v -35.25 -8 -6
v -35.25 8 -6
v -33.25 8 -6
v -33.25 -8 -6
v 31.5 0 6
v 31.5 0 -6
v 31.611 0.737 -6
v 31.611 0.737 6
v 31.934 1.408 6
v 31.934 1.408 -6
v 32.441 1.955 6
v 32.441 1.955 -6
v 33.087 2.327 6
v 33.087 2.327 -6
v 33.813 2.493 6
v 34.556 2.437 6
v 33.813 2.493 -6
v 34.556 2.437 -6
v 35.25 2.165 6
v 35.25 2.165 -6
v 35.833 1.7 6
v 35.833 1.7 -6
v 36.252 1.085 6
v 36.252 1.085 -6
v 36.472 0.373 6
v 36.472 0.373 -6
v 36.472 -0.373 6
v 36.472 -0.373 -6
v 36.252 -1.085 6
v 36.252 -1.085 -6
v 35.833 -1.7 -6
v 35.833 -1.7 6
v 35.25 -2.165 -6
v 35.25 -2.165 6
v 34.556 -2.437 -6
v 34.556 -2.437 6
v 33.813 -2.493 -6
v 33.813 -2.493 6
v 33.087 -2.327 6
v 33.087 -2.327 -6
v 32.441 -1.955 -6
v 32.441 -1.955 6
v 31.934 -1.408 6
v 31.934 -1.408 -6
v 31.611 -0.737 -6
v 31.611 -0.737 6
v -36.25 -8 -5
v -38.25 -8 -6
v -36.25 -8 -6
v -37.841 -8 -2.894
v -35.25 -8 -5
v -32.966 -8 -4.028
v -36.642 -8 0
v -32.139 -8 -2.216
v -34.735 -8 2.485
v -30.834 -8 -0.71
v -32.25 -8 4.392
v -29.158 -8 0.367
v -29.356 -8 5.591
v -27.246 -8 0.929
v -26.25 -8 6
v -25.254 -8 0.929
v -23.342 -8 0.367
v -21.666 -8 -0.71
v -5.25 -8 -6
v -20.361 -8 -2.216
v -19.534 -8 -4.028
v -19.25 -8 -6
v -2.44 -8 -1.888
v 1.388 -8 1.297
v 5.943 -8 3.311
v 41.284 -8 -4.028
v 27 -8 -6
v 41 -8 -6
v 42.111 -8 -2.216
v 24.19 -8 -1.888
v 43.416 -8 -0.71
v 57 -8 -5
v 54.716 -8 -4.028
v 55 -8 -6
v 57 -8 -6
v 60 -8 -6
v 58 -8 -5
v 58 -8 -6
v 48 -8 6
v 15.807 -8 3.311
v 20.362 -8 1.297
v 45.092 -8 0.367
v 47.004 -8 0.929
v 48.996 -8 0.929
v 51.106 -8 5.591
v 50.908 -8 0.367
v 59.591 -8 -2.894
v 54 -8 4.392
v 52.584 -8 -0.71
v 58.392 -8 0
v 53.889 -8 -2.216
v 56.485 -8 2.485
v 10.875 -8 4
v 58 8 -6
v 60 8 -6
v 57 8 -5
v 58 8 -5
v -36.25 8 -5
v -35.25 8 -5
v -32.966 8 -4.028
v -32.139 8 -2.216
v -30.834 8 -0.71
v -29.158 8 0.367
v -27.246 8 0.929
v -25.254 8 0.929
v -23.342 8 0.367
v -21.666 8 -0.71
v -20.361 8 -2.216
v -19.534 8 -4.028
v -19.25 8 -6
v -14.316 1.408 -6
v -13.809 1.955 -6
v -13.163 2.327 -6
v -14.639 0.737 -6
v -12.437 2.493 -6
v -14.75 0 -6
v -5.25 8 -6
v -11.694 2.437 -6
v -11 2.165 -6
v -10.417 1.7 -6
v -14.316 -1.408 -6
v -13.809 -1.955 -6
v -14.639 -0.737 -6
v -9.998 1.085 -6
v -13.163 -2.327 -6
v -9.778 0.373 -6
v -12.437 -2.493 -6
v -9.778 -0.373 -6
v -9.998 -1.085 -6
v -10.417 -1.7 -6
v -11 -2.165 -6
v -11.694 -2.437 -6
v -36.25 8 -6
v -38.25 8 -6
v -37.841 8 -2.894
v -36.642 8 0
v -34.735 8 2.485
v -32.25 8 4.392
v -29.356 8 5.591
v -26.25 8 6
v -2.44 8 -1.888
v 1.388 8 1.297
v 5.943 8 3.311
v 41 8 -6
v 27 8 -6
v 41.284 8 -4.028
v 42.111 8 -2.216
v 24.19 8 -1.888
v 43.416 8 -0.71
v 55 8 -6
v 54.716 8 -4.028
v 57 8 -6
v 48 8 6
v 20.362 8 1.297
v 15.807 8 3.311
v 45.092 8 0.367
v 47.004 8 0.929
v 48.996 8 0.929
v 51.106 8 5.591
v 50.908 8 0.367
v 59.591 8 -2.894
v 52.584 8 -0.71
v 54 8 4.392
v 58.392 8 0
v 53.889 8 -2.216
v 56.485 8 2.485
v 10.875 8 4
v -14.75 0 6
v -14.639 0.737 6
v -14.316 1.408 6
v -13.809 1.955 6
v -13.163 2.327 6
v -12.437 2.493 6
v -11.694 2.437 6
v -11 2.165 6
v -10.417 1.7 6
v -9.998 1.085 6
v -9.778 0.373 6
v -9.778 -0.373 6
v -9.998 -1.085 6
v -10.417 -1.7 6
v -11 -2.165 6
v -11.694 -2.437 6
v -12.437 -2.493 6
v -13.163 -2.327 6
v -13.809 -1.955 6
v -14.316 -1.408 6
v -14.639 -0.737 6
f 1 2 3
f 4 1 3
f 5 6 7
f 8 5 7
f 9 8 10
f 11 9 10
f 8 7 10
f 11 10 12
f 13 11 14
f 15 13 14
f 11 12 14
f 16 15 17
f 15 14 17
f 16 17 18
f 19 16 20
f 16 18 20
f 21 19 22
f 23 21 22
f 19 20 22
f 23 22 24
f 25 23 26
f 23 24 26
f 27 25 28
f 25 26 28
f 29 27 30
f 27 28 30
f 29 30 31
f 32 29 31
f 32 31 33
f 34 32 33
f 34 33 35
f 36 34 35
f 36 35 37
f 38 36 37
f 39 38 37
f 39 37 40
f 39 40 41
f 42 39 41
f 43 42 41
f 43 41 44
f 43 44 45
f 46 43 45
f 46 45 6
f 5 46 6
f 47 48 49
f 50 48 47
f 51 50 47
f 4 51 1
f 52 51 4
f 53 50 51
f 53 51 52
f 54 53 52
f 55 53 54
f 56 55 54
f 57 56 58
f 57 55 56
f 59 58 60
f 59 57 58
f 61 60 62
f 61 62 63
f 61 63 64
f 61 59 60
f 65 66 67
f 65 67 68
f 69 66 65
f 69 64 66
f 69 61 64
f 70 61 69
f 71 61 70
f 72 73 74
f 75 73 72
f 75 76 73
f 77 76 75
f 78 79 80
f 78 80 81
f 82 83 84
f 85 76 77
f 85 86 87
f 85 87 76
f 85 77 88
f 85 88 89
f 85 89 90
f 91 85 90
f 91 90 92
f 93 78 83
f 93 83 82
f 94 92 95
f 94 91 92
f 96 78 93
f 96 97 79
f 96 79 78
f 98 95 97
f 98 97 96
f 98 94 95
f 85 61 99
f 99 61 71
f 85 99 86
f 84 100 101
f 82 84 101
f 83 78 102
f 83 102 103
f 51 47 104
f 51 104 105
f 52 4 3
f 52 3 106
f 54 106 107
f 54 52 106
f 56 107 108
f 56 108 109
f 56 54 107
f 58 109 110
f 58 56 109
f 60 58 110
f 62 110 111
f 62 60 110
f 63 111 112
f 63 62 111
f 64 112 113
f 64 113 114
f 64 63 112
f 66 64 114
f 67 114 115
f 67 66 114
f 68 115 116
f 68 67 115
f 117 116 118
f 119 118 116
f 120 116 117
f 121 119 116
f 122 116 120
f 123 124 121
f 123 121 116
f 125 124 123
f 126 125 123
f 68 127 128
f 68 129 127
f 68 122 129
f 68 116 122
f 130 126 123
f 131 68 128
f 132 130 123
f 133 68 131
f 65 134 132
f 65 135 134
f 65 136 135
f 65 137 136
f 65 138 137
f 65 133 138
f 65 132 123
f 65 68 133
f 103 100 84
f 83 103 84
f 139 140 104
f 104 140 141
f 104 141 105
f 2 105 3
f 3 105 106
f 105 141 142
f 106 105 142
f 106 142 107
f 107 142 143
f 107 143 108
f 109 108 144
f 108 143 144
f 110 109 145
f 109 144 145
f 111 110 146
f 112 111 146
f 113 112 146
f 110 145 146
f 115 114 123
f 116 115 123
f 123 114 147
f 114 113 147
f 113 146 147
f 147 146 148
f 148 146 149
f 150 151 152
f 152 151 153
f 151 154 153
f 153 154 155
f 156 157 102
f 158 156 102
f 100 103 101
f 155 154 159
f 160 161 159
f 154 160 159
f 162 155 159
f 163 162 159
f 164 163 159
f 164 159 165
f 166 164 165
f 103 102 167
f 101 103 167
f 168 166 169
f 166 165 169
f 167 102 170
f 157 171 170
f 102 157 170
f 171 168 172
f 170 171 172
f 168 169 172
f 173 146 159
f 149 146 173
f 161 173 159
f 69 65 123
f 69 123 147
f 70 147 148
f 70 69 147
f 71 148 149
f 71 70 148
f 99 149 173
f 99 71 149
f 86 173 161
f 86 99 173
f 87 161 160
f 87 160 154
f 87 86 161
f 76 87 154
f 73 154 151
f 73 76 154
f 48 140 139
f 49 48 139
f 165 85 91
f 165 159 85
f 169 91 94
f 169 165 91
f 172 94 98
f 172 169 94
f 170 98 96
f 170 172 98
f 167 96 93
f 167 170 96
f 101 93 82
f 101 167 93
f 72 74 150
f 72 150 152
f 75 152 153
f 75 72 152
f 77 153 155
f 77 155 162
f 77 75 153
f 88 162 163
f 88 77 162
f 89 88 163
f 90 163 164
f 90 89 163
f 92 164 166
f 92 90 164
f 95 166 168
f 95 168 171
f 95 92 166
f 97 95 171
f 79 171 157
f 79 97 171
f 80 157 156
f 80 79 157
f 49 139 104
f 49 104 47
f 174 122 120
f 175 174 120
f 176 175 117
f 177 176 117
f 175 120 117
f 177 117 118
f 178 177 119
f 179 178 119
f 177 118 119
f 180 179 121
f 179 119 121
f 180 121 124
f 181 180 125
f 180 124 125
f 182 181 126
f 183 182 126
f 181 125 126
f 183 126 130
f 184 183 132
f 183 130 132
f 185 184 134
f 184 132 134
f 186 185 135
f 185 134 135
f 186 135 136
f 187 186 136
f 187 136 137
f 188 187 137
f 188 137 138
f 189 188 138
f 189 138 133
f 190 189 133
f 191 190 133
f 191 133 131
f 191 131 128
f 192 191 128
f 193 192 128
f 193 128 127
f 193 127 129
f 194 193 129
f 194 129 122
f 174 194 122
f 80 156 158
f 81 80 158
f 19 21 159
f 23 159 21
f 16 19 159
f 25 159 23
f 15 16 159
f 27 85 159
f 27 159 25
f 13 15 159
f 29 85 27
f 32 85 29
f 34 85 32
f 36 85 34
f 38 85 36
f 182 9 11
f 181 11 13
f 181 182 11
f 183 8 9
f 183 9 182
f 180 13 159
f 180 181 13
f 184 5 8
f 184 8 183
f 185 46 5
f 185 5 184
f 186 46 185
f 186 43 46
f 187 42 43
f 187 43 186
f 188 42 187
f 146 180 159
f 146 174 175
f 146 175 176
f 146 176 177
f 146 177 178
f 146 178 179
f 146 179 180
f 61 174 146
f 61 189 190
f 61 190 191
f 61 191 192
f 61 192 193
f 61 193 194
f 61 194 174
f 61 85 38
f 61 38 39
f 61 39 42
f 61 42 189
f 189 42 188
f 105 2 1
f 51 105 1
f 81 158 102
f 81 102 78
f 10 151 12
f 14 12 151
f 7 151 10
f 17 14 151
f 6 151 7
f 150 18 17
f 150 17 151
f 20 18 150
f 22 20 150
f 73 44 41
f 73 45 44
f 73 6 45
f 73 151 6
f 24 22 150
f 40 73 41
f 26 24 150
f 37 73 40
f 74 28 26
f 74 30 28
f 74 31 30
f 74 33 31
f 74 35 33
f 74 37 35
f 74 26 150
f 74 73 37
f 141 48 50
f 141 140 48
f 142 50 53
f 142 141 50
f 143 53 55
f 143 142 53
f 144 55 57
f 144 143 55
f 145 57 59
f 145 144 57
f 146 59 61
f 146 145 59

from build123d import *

# Parameters (mm, degrees)
F1_DEPTH = 8
F3_R     = 11.99999
F4_D     = 5
F5_W     = 1
F5_H     = 16
F6_DEPTH = 1


# Not quite as in the source:
# - a fillet or chamfer is up to 0.001 mm smaller than in the source, because OpenCascade refuses the exact size


with BuildPart() as f1:
    # F0 (on Front) → F1 (new body, symmetric)
    with BuildSketch(Plane.XZ):
        with BuildLine():
            Line((-38.25, -6), (-33.25, -6))
            ThreePointArc((-33.25, -6), (-26.25, 1), (-19.25, -6))
            Line((-19.25, -6), (-5.2495154966, -6))
            ThreePointArc((-5.2495154966, -6), (10.875, 4), (26.9995154966, -6))
            Line((26.9995154966, -6), (41, -6))
            ThreePointArc((41, -6), (48, 1), (55, -6))
            Line((55, -6), (60, -6))
            Line((60, -6), (60, 6))
            Line((60, 6), (-38.25, 6))
            Line((-38.25, 6), (-38.25, -6))
        make_face()
    extrude(amount=F1_DEPTH, both=True)

    # F3 (radius 12 in the source; OpenCascade refuses exactly that, so slightly less here)
    f3_edges = [f1.edges().sort_by_distance(p)[0] for p in [
        (-38.25, 0, 6),
        (60, 0, 6),
    ]]
    fillet(f3_edges, radius=F3_R)

    # F4 (through all)
    with Locations(Plane.XY.offset(6)):
        with Locations((-12.25, 0), (34, 0)):
            Hole(F4_D / 2)

    # F5 (on face) → F6 (cut)
    with BuildSketch(Plane(origin=(0, 0, -6), x_dir=(1, 0, 0), z_dir=(0, 0, -1))):
        with Locations((-35.75, 0)):
            Rectangle(F5_W, F5_H)
        with Locations((57.5, 0)):
            Rectangle(F5_W, F5_H)
    extrude(amount=-F6_DEPTH, mode=Mode.SUBTRACT)


solid = f1.part
